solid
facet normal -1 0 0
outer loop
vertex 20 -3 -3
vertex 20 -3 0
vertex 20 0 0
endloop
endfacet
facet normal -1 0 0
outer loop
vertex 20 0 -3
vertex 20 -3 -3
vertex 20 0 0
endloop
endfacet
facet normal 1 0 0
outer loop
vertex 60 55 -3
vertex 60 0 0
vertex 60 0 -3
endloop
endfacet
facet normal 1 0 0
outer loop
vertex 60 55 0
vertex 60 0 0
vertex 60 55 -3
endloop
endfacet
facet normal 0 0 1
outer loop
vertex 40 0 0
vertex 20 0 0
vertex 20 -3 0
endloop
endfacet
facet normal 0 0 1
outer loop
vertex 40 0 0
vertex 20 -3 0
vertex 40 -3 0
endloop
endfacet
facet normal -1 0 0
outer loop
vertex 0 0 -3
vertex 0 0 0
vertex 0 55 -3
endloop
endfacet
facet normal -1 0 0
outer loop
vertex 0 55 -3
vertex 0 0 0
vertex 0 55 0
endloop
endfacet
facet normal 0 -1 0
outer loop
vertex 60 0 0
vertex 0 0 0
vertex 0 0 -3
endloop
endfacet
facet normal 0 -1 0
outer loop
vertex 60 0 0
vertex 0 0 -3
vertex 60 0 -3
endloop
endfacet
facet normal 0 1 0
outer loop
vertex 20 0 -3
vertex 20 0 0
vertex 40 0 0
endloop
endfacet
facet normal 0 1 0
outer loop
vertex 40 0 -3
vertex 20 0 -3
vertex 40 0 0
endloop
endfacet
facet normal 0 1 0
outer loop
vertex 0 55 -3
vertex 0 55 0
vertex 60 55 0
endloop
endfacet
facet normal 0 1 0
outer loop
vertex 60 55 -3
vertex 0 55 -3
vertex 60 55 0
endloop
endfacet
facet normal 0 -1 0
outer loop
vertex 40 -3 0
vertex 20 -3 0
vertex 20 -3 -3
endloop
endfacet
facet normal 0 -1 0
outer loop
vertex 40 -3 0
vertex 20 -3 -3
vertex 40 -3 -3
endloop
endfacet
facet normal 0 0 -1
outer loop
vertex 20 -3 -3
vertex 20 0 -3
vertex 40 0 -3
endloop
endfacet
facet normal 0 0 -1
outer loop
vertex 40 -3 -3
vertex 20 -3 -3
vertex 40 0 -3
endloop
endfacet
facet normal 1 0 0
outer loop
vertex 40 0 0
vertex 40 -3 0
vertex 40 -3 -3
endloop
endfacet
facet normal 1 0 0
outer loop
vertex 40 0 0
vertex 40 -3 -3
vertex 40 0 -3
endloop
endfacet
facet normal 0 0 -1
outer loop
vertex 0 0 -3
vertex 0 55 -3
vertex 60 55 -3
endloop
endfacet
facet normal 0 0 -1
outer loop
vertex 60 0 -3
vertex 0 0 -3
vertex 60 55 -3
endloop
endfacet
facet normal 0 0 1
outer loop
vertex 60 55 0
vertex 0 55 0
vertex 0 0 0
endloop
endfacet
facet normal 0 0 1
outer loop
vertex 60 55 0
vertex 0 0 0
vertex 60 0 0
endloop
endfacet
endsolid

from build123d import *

# Parameters (mm, degrees)
SKETCH2_W           = 60
SKETCH2_H           = 55
BOSS_EXTRUDE1_DEPTH = 3
SKETCH3_W           = 20
SKETCH3_H           = 3
BOSS_EXTRUDE2_DEPTH = 3


with BuildPart() as part:
    # Sketch2 → Boss-Extrude1 (new body)
    with BuildSketch(Plane.XY):
        with Locations((30, 27.5)):
            Rectangle(SKETCH2_W, SKETCH2_H)
    extrude(amount=-BOSS_EXTRUDE1_DEPTH)


with BuildPart() as body_2:
    # Sketch3 → Boss-Extrude2 (new body)
    with BuildSketch(Plane.XY):
        with Locations((30, -1.5)):
            Rectangle(SKETCH3_W, SKETCH3_H)
    extrude(amount=-BOSS_EXTRUDE2_DEPTH)


solid = Compound([part.part, body_2.part])
